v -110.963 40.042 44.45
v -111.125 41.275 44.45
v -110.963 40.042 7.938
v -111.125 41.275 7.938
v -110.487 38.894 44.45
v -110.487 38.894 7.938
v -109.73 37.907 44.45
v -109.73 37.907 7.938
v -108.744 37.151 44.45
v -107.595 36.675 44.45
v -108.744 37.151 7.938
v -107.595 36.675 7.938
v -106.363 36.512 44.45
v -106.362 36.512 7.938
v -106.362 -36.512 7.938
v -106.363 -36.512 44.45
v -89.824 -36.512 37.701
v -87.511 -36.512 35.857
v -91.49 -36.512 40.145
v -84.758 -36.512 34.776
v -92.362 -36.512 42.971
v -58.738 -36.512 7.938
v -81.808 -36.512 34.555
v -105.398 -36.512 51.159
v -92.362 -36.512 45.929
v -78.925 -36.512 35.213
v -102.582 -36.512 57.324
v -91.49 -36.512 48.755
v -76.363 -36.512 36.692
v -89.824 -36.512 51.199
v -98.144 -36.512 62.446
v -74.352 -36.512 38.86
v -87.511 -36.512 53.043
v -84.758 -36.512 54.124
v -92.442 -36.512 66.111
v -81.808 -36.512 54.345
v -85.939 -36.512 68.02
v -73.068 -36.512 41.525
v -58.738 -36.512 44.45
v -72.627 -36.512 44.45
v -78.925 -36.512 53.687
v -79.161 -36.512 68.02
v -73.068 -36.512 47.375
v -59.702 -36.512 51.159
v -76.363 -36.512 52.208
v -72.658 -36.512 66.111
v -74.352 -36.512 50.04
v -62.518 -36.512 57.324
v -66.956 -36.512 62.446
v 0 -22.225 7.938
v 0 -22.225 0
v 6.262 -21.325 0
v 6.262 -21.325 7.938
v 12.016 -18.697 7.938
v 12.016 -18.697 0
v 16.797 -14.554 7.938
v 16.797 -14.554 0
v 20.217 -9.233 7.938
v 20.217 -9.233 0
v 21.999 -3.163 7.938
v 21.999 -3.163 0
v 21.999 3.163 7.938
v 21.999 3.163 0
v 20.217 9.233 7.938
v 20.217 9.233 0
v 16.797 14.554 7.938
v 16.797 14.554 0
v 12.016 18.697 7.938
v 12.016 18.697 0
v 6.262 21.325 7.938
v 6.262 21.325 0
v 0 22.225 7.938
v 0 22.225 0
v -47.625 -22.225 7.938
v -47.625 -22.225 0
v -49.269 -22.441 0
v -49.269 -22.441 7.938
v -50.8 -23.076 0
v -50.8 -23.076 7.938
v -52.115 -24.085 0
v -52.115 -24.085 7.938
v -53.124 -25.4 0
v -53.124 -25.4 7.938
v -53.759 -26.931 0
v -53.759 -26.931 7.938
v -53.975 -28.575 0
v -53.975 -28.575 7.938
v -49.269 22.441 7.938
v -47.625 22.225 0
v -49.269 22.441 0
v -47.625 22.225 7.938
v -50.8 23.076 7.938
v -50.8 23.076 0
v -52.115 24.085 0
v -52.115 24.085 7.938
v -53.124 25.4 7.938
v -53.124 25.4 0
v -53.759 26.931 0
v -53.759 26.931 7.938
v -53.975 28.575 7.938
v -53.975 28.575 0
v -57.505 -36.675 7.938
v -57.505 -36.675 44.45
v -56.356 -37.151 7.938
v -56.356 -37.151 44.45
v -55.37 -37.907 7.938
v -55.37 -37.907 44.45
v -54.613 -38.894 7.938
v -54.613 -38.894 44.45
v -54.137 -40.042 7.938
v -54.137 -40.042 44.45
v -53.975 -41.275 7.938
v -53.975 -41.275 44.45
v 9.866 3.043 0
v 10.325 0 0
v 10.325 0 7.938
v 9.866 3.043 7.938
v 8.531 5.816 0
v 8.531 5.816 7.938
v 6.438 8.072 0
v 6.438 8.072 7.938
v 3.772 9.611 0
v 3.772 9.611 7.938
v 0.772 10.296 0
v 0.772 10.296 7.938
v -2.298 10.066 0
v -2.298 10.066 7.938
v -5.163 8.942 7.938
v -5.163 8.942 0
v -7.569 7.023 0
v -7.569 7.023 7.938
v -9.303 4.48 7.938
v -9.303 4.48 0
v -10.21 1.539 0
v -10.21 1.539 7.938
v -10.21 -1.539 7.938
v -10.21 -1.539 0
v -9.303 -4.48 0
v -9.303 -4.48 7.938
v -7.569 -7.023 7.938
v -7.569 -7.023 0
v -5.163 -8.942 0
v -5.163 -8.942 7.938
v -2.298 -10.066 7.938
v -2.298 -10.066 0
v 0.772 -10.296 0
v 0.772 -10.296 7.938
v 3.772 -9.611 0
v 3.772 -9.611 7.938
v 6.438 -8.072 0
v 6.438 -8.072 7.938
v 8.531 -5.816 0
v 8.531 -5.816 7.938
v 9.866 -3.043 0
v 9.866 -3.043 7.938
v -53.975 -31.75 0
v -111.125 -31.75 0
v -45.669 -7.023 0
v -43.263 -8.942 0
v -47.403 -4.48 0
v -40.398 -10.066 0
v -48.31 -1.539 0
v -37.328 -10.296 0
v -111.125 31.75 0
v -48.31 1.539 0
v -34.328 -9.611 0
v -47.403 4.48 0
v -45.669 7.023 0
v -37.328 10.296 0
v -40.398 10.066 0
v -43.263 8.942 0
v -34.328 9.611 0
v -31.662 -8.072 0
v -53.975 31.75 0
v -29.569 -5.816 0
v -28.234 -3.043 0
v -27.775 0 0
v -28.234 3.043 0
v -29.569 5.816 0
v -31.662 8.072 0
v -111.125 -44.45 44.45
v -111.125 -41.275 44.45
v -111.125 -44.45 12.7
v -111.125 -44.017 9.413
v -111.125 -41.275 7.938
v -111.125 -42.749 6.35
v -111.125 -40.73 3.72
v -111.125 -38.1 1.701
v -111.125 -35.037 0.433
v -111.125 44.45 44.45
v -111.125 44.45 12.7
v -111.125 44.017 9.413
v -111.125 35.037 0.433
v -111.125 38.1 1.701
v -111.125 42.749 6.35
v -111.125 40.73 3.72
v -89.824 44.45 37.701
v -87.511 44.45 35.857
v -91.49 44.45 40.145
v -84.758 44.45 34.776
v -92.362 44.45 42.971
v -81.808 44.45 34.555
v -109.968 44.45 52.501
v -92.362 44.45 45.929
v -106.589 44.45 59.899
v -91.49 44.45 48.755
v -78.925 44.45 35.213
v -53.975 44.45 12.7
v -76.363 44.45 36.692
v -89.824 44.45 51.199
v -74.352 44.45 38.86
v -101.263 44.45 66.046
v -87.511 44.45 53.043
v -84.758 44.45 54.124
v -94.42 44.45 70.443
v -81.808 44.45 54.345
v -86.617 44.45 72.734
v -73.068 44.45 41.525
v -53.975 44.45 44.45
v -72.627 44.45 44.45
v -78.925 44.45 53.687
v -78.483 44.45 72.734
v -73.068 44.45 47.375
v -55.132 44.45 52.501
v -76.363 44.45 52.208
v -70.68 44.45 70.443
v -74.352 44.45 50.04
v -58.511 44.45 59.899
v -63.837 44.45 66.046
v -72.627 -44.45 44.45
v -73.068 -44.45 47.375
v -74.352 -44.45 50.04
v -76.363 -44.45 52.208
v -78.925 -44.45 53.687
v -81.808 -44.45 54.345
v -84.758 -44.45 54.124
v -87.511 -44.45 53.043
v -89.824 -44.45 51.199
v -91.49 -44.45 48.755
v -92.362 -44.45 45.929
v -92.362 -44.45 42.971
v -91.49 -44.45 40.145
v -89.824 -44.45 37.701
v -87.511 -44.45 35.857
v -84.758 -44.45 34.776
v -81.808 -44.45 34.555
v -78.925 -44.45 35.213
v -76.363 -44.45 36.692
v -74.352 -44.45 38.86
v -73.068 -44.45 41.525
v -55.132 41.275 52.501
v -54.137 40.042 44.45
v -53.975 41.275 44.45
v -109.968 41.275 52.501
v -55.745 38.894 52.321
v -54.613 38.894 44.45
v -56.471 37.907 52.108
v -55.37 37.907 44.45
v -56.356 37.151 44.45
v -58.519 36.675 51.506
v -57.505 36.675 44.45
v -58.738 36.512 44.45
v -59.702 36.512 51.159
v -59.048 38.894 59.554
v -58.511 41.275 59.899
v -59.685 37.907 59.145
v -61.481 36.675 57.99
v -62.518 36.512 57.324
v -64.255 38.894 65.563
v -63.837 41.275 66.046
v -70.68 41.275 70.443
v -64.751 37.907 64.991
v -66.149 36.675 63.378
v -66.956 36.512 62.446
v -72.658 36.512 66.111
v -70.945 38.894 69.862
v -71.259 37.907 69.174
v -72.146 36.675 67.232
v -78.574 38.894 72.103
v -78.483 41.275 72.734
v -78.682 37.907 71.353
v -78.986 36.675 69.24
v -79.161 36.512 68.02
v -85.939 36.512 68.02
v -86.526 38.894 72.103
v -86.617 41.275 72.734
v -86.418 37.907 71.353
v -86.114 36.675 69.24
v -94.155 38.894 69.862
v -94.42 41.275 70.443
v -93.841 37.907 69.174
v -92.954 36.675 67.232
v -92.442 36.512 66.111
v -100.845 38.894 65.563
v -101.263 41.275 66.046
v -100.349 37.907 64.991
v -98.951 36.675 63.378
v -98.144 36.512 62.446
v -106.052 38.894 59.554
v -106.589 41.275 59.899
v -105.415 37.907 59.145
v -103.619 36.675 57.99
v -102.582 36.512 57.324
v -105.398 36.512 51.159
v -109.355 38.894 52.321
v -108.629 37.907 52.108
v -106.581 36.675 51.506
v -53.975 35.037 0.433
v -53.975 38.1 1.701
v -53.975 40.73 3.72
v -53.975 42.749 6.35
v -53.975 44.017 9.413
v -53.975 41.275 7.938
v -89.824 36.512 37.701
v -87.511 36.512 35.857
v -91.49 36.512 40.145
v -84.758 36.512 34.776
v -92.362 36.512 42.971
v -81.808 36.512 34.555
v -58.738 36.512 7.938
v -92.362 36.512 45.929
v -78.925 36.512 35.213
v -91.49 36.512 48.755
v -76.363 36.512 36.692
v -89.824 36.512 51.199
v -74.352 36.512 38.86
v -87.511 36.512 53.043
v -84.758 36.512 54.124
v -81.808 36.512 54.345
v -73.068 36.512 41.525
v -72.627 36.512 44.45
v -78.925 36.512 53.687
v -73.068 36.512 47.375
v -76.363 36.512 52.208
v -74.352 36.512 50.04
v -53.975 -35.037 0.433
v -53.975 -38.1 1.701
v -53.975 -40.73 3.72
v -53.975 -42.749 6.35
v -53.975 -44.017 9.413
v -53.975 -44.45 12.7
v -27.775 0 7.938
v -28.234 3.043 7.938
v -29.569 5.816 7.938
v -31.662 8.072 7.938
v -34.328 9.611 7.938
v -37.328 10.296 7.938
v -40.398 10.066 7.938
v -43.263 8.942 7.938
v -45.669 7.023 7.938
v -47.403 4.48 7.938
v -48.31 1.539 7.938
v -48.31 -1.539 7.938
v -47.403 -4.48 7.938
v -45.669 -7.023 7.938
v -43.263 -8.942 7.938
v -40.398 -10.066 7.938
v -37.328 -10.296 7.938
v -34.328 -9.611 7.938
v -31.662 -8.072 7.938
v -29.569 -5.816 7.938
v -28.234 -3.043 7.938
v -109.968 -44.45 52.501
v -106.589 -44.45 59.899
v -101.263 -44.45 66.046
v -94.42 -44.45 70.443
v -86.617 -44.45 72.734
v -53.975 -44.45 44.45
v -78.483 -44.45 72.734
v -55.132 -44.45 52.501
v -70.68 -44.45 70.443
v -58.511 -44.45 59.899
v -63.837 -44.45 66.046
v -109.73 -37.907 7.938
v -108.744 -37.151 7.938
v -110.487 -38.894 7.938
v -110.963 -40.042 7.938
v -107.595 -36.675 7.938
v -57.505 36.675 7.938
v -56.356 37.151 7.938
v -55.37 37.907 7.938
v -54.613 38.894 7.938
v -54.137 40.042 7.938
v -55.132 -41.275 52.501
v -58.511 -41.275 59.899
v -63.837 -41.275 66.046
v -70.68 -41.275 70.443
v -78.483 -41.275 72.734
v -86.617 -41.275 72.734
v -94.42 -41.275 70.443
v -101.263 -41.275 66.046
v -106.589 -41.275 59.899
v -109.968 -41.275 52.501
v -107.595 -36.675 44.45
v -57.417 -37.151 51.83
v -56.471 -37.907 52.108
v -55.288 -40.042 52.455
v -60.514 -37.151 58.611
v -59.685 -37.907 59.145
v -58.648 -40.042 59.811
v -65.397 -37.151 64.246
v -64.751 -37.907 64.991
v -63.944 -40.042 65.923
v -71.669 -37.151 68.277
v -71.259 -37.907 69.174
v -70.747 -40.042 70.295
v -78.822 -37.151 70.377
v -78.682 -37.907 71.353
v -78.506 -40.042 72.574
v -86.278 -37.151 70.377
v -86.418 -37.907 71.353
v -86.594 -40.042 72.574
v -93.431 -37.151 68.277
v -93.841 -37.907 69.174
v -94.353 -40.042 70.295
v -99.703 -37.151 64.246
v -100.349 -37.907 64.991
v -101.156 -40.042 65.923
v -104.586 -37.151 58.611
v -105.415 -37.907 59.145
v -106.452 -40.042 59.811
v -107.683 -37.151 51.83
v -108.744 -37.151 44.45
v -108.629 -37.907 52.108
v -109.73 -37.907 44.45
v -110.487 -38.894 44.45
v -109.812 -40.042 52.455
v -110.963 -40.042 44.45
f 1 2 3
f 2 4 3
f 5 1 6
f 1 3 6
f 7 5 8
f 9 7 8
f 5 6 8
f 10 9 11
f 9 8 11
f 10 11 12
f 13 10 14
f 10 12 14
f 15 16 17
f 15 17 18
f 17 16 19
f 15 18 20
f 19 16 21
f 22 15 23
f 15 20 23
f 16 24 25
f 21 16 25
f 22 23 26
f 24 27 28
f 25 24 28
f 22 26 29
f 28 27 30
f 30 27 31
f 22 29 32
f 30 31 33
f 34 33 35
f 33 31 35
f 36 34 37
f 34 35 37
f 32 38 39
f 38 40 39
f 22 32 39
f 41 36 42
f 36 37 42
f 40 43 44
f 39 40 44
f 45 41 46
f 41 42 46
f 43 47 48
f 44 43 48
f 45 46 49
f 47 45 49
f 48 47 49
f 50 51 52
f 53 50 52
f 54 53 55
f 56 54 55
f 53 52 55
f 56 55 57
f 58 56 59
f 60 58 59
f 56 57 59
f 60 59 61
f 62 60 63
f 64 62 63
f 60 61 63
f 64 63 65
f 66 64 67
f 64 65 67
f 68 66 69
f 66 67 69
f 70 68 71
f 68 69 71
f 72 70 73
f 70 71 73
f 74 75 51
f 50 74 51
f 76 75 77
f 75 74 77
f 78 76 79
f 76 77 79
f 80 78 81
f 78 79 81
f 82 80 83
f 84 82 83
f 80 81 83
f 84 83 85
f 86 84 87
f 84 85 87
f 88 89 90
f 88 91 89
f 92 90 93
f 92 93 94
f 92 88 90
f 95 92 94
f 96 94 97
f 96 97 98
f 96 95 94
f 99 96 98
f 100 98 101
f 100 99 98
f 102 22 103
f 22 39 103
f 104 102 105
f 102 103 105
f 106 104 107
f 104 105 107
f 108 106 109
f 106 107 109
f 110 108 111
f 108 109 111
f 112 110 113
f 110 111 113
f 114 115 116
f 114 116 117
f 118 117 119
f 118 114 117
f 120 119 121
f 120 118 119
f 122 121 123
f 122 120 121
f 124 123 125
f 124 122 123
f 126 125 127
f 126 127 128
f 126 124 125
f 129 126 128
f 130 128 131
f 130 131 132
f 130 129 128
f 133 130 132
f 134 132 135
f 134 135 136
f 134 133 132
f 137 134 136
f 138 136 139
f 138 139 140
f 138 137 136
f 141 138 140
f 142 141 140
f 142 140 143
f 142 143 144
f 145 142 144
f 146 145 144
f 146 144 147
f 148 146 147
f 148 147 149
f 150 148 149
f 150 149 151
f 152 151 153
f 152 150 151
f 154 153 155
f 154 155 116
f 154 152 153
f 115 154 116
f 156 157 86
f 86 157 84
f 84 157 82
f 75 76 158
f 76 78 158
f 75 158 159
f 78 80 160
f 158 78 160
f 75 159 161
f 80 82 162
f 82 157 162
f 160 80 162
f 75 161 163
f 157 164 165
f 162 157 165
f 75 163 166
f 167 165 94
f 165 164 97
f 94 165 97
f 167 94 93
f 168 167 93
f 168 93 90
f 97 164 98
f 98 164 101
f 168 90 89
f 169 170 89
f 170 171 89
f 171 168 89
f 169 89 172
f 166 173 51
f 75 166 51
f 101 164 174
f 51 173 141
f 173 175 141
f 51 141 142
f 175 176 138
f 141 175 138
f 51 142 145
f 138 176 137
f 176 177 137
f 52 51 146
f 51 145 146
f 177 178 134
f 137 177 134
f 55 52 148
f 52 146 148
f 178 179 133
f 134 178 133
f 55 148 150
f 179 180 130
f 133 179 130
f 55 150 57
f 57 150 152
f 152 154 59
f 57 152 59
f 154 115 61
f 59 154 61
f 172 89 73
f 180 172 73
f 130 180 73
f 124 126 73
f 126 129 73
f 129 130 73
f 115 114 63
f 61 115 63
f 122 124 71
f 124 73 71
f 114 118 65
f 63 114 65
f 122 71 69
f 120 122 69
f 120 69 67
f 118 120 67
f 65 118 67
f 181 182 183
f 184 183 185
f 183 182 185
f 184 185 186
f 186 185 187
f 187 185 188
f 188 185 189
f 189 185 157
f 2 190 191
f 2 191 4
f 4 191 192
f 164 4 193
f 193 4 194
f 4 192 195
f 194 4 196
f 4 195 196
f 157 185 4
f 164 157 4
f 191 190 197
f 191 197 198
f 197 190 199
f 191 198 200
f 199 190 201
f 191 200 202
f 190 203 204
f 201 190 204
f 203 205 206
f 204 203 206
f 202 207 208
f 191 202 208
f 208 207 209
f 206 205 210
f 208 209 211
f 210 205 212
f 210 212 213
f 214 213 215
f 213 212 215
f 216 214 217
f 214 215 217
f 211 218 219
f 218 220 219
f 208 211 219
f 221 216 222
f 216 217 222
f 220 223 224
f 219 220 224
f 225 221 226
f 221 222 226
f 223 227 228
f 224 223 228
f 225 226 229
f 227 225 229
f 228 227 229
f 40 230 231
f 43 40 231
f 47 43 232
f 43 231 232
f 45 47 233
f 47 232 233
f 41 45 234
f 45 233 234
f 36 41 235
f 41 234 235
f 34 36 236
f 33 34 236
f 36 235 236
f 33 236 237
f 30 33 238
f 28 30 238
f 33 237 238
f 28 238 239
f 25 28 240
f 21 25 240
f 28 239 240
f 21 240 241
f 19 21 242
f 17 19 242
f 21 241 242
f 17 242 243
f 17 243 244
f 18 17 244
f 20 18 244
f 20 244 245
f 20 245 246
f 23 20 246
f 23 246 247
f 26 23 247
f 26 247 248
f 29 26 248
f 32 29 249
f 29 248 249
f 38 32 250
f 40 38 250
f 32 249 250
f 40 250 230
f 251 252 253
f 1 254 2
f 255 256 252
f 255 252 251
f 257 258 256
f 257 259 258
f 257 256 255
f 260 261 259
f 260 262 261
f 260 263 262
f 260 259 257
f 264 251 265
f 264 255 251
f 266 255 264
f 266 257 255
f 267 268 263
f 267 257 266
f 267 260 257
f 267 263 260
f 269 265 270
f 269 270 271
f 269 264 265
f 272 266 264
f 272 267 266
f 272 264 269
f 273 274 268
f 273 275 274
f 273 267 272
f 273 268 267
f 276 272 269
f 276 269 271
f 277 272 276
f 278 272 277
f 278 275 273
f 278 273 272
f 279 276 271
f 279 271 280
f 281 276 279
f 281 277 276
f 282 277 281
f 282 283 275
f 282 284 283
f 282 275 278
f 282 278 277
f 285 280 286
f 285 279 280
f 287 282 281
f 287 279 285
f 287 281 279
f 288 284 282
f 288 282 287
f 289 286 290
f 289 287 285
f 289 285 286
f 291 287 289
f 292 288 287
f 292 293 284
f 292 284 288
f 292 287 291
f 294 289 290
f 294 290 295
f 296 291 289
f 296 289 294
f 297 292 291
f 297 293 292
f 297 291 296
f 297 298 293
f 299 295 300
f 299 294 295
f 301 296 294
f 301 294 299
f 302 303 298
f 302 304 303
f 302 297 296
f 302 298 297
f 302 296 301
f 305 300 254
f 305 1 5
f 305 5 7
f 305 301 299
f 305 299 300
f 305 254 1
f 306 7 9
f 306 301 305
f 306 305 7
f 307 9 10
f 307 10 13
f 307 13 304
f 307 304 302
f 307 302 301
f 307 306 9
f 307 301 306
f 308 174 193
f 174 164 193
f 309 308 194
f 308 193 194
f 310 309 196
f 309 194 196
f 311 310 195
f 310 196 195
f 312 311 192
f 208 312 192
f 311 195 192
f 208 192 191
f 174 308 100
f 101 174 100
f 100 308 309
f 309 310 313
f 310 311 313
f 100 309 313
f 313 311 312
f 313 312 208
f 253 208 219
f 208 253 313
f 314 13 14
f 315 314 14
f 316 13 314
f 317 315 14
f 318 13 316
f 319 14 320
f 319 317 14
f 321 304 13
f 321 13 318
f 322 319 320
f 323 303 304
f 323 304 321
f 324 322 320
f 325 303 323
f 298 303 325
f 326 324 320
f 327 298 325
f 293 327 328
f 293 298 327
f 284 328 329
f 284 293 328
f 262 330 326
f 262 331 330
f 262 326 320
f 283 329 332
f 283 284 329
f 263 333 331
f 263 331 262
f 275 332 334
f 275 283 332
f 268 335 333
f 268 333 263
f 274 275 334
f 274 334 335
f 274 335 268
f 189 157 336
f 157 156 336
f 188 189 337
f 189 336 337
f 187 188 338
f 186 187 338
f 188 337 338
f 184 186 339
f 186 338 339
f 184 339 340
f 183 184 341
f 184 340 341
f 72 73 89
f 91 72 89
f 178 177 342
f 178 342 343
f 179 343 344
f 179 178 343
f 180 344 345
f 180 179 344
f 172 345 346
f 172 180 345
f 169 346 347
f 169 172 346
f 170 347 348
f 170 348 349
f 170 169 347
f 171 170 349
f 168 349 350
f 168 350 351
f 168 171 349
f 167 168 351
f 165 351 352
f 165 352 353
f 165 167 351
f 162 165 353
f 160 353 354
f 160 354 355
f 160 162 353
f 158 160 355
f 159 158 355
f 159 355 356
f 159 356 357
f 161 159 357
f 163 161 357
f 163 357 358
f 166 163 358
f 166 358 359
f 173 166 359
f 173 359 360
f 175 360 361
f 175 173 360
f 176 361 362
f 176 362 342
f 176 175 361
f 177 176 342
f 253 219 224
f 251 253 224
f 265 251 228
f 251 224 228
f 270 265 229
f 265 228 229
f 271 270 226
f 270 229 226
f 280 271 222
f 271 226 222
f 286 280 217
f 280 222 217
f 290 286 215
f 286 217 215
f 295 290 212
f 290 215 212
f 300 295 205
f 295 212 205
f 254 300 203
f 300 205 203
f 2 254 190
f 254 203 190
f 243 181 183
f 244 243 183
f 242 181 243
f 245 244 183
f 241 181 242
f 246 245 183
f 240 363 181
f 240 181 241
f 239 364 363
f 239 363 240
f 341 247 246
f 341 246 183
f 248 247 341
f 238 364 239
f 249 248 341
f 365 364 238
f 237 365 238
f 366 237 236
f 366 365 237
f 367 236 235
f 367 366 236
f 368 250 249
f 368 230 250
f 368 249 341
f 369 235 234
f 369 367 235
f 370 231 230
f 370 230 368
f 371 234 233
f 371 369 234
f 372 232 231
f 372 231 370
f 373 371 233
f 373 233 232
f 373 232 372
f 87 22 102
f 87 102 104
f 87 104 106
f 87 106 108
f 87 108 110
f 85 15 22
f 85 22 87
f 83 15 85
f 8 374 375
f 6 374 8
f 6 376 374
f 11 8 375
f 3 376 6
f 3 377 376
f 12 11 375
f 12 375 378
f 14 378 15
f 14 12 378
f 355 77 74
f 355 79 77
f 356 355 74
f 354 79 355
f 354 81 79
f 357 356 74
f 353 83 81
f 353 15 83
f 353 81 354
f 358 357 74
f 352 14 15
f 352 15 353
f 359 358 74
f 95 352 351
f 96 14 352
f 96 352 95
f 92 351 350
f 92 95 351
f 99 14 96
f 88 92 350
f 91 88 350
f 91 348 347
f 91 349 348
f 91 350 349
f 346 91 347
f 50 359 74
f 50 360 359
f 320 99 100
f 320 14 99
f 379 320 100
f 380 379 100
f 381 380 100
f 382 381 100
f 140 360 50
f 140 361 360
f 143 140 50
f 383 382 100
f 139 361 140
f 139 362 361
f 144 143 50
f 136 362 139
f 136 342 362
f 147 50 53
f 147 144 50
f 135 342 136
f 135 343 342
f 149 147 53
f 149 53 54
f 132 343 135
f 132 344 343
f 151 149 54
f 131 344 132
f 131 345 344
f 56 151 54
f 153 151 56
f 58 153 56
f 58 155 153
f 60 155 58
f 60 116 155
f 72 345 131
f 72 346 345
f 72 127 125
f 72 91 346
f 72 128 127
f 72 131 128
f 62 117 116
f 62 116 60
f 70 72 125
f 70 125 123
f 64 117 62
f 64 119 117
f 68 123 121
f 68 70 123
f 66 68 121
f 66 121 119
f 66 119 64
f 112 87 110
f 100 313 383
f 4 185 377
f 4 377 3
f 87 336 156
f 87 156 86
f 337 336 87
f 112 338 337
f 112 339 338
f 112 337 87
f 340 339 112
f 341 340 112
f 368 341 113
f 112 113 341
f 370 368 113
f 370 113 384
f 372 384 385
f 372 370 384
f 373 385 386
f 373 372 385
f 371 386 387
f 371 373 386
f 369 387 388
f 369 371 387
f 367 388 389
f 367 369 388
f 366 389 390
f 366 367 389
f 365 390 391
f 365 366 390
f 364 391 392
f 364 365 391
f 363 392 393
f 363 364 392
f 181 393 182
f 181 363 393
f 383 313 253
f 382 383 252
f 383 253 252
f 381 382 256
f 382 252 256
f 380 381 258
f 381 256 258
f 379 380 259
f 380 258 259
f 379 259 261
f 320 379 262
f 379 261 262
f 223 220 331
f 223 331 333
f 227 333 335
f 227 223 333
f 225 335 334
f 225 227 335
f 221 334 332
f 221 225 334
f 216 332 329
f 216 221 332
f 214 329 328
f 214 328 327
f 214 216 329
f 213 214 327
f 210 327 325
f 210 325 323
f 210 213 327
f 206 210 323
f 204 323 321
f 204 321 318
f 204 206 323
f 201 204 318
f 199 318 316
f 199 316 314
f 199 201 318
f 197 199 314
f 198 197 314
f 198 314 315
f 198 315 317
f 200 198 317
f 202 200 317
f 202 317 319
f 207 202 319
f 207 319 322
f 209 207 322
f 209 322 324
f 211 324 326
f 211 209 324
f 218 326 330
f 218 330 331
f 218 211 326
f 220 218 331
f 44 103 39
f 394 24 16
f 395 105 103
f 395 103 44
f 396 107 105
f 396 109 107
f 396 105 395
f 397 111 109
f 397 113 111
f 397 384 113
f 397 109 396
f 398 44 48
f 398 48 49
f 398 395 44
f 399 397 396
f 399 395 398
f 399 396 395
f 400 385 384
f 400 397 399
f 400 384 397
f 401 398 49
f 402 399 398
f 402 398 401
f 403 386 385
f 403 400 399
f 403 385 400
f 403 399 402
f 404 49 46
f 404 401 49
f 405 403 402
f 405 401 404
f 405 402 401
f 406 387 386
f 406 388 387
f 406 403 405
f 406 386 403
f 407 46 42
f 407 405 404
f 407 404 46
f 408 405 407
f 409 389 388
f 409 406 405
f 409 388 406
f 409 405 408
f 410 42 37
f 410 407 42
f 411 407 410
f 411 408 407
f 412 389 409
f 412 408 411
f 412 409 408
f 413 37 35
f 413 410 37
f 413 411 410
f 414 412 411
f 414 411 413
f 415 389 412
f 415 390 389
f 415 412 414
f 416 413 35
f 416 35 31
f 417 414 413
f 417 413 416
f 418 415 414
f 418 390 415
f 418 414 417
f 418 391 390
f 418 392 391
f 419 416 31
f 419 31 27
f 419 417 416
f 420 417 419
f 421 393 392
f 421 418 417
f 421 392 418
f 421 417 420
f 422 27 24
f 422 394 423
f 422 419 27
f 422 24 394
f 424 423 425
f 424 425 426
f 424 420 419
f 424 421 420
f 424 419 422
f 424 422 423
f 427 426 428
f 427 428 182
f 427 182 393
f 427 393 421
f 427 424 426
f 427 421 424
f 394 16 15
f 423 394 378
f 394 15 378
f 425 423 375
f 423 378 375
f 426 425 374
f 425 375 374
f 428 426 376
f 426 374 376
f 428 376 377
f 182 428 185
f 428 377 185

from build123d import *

# Parameters (mm, degrees)
F0_R     = 10.3251
F1_DEPTH = 7.9375
F2_R     = 6.35
F3_R     = 9.92251
F4_DEPTH = 7.9375
F6_R     = 12.7
F7_R     = 4.7625


with BuildPart() as f1:
    # F0 (on Top) → F1 (new body)
    with BuildSketch(Plane.XY):
        with BuildLine():
            Line((-53.975, -22.225), (0, -22.225))
            ThreePointArc((0, -22.225), (22.225, 0), (0, 22.225))
            Line((0, 22.225), (-53.975, 22.225))
            Line((-53.975, 22.225), (-53.975, 44.45))
            Line((-53.975, 44.45), (-111.125, 44.45))
            Line((-111.125, 44.45), (-111.125, -44.45))
            Line((-111.125, -44.45), (-53.975, -44.45))
            Line((-53.975, -44.45), (-53.975, -22.225))
        make_face()
        with Locations((-38.1, 0)):
            Circle(F0_R, mode=Mode.SUBTRACT)
        Circle(F0_R, mode=Mode.SUBTRACT)
    extrude(amount=F1_DEPTH)

    # F2
    f2_edges = [f1.edges().sort_by_distance(p)[0] for p in [
        (-53.975, -22.225, 3.96875),
        (-53.975, 22.225, 3.96875),
    ]]
    fillet(f2_edges, radius=F2_R)

    # F3 (on face) → F4 (join)
    with BuildSketch(Plane.XZ.offset(44.45)):
        with BuildLine():
            Line((-111.125, 44.45), (-111.125, 7.9375))
            Line((-111.125, 7.9375), (-53.975, 7.9375))
            Line((-53.975, 7.9375), (-53.975, 44.45))
            ThreePointArc((-53.975, 44.45), (-82.55, 73.025), (-111.125, 44.45))
        make_face()
        with Locations((-82.55, 44.45)):
            Circle(F3_R, mode=Mode.SUBTRACT)
    extrude(amount=-F4_DEPTH)

    # F5: F1 across plane


with BuildPart() as f1_1:
    add(f1.part)
    add(f1.part.mirror(Plane.XZ))

    # F6
    f6_edges = [f1_1.edges().sort_by_distance(p)[0] for p in [
        (-82.55, 44.45, 0),
        (-82.55, -44.45, 0),
    ]]
    fillet(f6_edges, radius=F6_R)

    # F7
    f7_edges = [f1_1.edges().sort_by_distance(p)[0] for p in [
        (-82.55, 36.5125, 73.025),
        (-82.55, -36.5125, 73.025),
    ]]
    fillet(f7_edges, radius=F7_R)


solid = f1_1.part
